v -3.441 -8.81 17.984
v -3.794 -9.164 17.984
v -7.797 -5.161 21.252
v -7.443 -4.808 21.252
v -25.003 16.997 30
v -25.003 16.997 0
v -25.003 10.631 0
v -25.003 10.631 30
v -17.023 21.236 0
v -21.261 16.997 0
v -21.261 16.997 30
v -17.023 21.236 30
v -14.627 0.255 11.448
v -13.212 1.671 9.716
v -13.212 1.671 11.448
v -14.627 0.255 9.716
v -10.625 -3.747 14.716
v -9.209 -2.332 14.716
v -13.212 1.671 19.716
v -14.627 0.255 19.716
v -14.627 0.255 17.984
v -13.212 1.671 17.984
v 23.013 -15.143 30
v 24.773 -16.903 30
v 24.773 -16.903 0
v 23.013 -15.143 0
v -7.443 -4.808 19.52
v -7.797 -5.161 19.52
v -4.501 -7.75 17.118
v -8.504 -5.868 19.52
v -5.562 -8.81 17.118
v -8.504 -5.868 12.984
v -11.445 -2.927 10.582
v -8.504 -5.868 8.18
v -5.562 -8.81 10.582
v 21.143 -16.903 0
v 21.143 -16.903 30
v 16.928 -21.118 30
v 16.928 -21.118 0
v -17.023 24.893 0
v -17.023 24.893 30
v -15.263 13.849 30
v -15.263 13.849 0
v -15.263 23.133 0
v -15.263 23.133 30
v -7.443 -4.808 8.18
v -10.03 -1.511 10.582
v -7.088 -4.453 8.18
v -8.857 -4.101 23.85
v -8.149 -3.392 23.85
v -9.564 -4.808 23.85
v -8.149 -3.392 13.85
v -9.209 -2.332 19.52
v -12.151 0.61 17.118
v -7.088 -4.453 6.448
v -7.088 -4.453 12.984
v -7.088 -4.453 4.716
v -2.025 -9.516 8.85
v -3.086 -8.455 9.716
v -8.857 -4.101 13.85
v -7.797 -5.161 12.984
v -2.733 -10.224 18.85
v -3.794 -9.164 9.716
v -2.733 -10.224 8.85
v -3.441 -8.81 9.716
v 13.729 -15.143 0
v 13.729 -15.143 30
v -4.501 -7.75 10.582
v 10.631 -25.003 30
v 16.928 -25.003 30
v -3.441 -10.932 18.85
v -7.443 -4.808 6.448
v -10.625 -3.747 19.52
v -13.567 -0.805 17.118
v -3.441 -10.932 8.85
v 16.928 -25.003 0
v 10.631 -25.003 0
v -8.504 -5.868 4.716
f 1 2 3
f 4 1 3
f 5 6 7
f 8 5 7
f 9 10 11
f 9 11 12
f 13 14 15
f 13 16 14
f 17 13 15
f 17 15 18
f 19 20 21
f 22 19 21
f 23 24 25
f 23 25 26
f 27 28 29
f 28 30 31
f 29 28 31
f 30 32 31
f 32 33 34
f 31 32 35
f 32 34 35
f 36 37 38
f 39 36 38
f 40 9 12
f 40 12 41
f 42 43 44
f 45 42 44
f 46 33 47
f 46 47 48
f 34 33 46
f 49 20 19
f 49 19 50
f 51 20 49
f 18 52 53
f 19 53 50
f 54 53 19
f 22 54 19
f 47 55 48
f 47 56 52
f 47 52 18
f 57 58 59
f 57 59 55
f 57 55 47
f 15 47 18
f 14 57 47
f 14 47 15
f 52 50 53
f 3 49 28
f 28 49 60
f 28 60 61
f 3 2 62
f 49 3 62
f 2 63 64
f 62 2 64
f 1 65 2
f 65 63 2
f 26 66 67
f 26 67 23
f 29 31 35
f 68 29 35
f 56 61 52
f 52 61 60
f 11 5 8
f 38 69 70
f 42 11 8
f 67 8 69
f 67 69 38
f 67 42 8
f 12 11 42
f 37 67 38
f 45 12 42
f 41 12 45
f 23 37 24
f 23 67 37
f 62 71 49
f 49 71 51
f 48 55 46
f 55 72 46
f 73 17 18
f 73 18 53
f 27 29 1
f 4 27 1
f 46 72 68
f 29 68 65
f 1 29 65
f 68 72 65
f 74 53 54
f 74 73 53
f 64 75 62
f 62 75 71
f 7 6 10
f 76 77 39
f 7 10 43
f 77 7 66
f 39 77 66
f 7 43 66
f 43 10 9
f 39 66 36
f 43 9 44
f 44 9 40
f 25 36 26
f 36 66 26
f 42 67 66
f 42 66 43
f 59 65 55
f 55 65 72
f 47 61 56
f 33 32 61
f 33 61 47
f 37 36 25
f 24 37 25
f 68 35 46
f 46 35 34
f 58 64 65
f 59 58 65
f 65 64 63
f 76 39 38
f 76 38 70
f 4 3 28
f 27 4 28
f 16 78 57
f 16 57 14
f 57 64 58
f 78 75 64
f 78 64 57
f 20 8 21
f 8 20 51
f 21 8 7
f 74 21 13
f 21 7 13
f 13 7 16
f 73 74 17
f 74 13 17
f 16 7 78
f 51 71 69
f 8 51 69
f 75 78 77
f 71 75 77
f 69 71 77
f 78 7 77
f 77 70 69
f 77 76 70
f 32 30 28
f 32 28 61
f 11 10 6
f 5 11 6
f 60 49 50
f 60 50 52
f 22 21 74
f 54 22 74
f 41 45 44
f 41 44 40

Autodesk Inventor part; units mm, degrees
ref_plane "YZ Plane" through (0, 0, 0) normal (1, 0, 0) x (0, 1, 0)
ref_plane "XZ Plane" through (0, 0, 0) normal (0, 1, 0) x (-1, 0, 0)
sketch "Sketch1" plane through (0, 0, 0) normal (0, 0, 1) x (1, 0, 0)
  line L0 (21.1431, -16.9027) -> (16.9281, -21.1177)
  line L1 (-21.2613, 16.9973) -> (-17.0227, 21.2358)
  line L2 (-17.0227, 21.2358) -> (16.9281, -21.1177) construction
  line L3 (21.1431, -16.9027) -> (-21.2613, 16.9973) construction
  line L4 (-17.0227, 21.2358) -> (36.8231, 21.2358) construction
  line L5 (16.9281, -21.1177) -> (16.9281, -25.0027)
  line L6 (-17.0227, 21.2358) -> (-17.0227, 24.8927)
  line L7 (21.1431, -16.9027) -> (24.7727, -16.9027)
  line L8 (24.7727, -16.9027) -> (-17.0227, 24.8927)
  line L9 (-25.0027, 16.9973) -> (-25.0027, 10.6306)
  line L10 (16.9281, -25.0027) -> (10.6306, -25.0027)
  line L11 (-25.0027, 10.6306) -> (10.6306, -25.0027)
  line L12 (-25.0027, 16.9973) -> (-7.0741, 16.9973) construction
  line L13 (-17.1227, 21.2773) -> (-21.3027, 17.0973)
  line L14 (16.8927, -21.1827) -> (21.0727, -17.0027)
  line L15 (24.7727, -17.0027) -> (21.1414, -17.0027)
  line L16 (22.7727, -25.0027) -> (-23.0273, -25.0027)
  line L17 (16.8927, -25.0027) -> (16.8927, -21.2526)
  line L18 (-17.1227, 25.0973) -> (-17.1227, 21.3471)
  line L19 (-25.0027, 17.0973) -> (-21.3714, 17.0973)
  line L20 (-21.2613, 16.9973) -> (-25.0027, 16.9973)
  point P0 (0, 0)
  point P1 (16.8927, -21.2526)
extrude "Extrusion1" add sketch "Sketch1" along normal blind 30
ref_plane "Work Plane1" through (16.9, -16.9, -8) normal (-0.7071068, -0.7071068, 0) x (0, 0, 1)
sketch "Sketch7" plane through (0, 0, 30) normal (0, 0, 1) x (1, 0, 0)
  line L0 (21.1431, -16.9027) -> (24.7727, -16.9027) projected
  line L1 (24.7727, -16.9027) -> (-17.0227, 24.8927) projected
  line L2 (-17.0227, 24.8927) -> (-17.0227, 21.2358) projected
  line L3 (-17.0227, 21.2358) -> (-21.2613, 16.9973) projected
  line L4 (-21.2613, 16.9973) -> (-25.0027, 16.9973) projected
  line L5 (-25.0027, 16.9973) -> (-25.0027, 10.6306) projected
  line L6 (-25.0027, 10.6306) -> (10.6306, -25.0027) projected
  line L7 (10.6306, -25.0027) -> (16.9281, -25.0027) projected
  line L8 (16.9281, -25.0027) -> (16.9281, -21.1177) projected
  line L9 (16.9281, -21.1177) -> (21.1431, -16.9027) projected
  line L10 (3.875, 3.995) -> (-7.1861, -7.1861)
  line L11 (-25.0027, 10.6306) -> (10.6306, -25.0027) projected
  line L12 (23.0128, -5.8586) -> (13.7286, -15.1428)
  line L13 (13.7286, -15.1428) -> (-15.2628, 13.8486)
  line L14 (-15.2628, 13.8486) -> (-5.9786, 23.1328)
  line L15 (-5.9786, 23.1328) -> (23.0128, -5.8586)
  line L16 (23.0128, -5.8586) -> (-15.2628, 13.8486) construction
  line L17 (13.7286, -15.1428) -> (-5.9786, 23.1328) construction
  line L18 (-15.2628, 13.8486) -> (-15.2628, 23.1328)
  line L19 (24.7727, -16.9027) -> (-17.0227, 24.8927) projected
  line L20 (13.7286, -15.1428) -> (23.0128, -15.1428)
  point P0 (0, 0)
  dimension "d28" = 41
  dimension "d29" = 1
  dimension "d74" = 0
extrude "Extrusion7" cut sketch "Sketch7" against normal through all contours L20 L12 L1 | L12 L13 L10 L1 | L1 L14 L15 L12 | L10 L13 L14 L1 | L14 L18 L1
sketch "Sketch10" plane through (10.6306, -25.0027, 30) normal (-0.7071068, -0.7071068, 0) x (-0.7071068, 0.7071068, 0)
  line L0 (1.6838, 16.5215) -> (7.0744, 19.4702) construction
  line L1 (7.0744, 19.4702) -> (7.0744, 10.5304) construction
  line L2 (7.0744, 10.5304) -> (1.6838, 10.5304) construction
  line L3 (1.6838, 10.5304) -> (1.6838, 6.839) construction
  line L4 (1.6838, 6.839) -> (6.7206, 6.839) construction
  line L5 (6.7206, 6.839) -> (6.7206, 1.2092) construction
  line L6 (6.7206, 1.2092) -> (1.6838, 1.2092) construction
  line L7 (1.6838, 1.2092) -> (1.6838, -3.423) construction
  line L8 (1.6838, -3.423) -> (55.1934, -3.423) construction
  line L9 (1.6838, 30.377) -> (1.6838, 26.2152) construction
  line L10 (1.6838, 26.2152) -> (7.1181, 26.2152) construction
  line L11 (7.1181, 26.2152) -> (7.1181, 20.0634) construction
  line L12 (7.1181, 20.0634) -> (1.6838, 20.0634) construction
  line L13 (1.6838, 20.0634) -> (1.6838, 16.5215) construction
  line L14 (7.0744, 15.0003) -> (55.1934, 14.9149) construction
  line L15 (1.6838, 30.377) -> (36.6838, 30.377) construction
  line L16 (36.6838, -3.423) -> (1.6838, -3.423) construction
  line L17 (19.8996, 21.1501) -> (19.8996, 11.1501)
  line L18 (19.8996, 11.1501) -> (28.5599, 6.1501)
  line L19 (19.8996, 21.1501) -> (21.3996, 20.2841)
  line L20 (21.3996, 20.2841) -> (21.3996, 12.0161)
  line L21 (21.3996, 12.0161) -> (27.0599, 8.7482)
  line L22 (27.0599, 8.7482) -> (27.0599, 17.0161)
  line L23 (27.0599, 17.0161) -> (28.5599, 16.1501)
  line L24 (28.5599, 16.1501) -> (28.5599, 6.1501)
  line L25 (50.3931, 0) -> (0, 0) construction
  line L26 (50.3931, 30) -> (50.3931, 0) construction
  line L27 (50.3931, 15) -> (0, 15) construction
  line L28 (0, 30) -> (0, 0) construction
  point P0 (25.1966, 30)
  point P1 (25.1966, 15)
  dimension "d40" = 1.5
  dimension "d41" = 1.5
  dimension "d42" = 1.5
  dimension "d43" = 10
  dimension "d44" = 10
  dimension "d75" = 8.268
  dimension "d76" = 120
emboss "Emboss1" sketch "Sketch10" operation cut depth 1 direction (0.7071068, 0.7071068, 0)
sketch "Sketch11" plane through (10.6306, -25.0027, 30) normal (-0.7071068, -0.7071068, 0) x (-0.7071068, 0.7071068, 0)
  line L0 (21.3996, 12.0161) -> (27.0599, 8.7482) construction
  line L1 (27.0599, 8.7482) -> (27.0599, 17.0161) construction
  line L2 (27.0599, 17.0161) -> (28.5599, 16.1501) construction
  line L3 (28.5599, 16.1501) -> (28.5599, 6.1501) construction
  line L4 (28.5599, 6.1501) -> (19.8996, 11.1501) construction
  line L5 (19.8996, 11.1501) -> (19.8996, 21.1501) construction
  line L6 (19.8996, 21.1501) -> (21.3996, 20.2841) construction
  line L7 (21.3996, 20.2841) -> (21.3996, 12.0161) construction
  line L8 (50.3931, 30) -> (0, 30) construction
  line L9 (0, 30) -> (0, 0) construction
  line L10 (50.3931, 0) -> (0, 0) construction
  line L11 (50.3931, 30) -> (50.3931, 0) construction
  line L12 (9.2379, 27.3057) -> (21.3996, 20.2841) construction
  line L13 (21.3996, 20.2841) -> (21.3996, 12.0161) construction
  line L14 (21.3996, 12.0161) -> (27.0599, 8.7482) construction
  line L15 (27.0599, 8.7482) -> (27.0599, 7.4216) construction
  line L16 (27.0599, 7.4216) -> (17.8982, 13.0177) construction
  line L17 (17.8982, 13.0177) -> (17.8982, 3.0177) construction
  line L18 (17.8982, 3.0177) -> (9.2379, 8.0177) construction
  line L19 (9.2379, 8.0177) -> (9.2379, 27.3057) construction
  line L20 (15.5651, 18.4016) -> (15.5, -16.9) construction
  line L21 (15.5651, 18.4016) -> (-17.5, 16.9) construction
  line L22 (-17.5, 16.9) -> (-17.5, 12.7382) construction
  line L23 (-17.5, 12.7382) -> (-12.0658, 12.7382) construction
  line L24 (-12.0658, 12.7382) -> (-12.0658, 6.5864) construction
  line L25 (-12.0658, 6.5864) -> (-17.5, 6.5864) construction
  line L26 (-17.5, 6.5864) -> (-17.5, 3.0446) construction
  line L27 (-17.5, 3.0446) -> (-12.1095, 3.0446) construction
  line L28 (-12.1095, 3.0446) -> (-12.1095, -2.9465) construction
  line L29 (-12.1095, -2.9465) -> (-17.5, -2.9465) construction
  line L30 (-17.5, -2.9465) -> (-17.5, -6.638) construction
  line L31 (-17.5, -6.638) -> (-12.4632, -6.638) construction
  line L32 (-12.4632, -6.638) -> (-12.4632, -12.2678) construction
  line L33 (-12.4632, -12.2678) -> (-17.5, -12.2678) construction
  line L34 (-17.5, -12.2678) -> (-17.5, -16.9) construction
  line L35 (-17.5, -16.9) -> (15.5, -16.9) construction
  line L36 (-12.1095, 0.049) -> (15.5326, 0.7508) construction
  line L37 (15.5, -16.9) -> (15.5651, 18.4016) construction
  line L38 (1.91, 17.7815) -> (1.91, -16.9) construction
  line L39 (15.5, -16.9) -> (-17.5, -16.9) construction
  line L40 (27.0599, 8.7482) -> (27.0599, 7.4216) construction
  line L41 (21.3996, 20.2841) -> (21.3996, 12.0161)
  line L42 (21.3996, 12.0161) -> (27.0599, 8.7482)
  line L43 (21.3996, 20.2841) -> (21.3996, 12.0161)
  line L44 (21.3996, 12.0161) -> (27.0599, 8.7482)
  line L45 (27.0599, 8.7482) -> (27.0599, 10.4802)
  line L46 (27.0599, 8.7482) -> (27.0599, 7.4216)
  line L47 (27.0599, 10.4802) -> (22.8996, 12.8822)
  line L48 (22.8996, 12.8822) -> (22.8996, 19.4181)
  line L49 (22.8996, 19.4181) -> (27.0599, 21.82)
  line L50 (21.3996, 20.2841) -> (27.0599, 23.552)
  line L51 (27.0599, 23.552) -> (27.0599, 21.82)
  point P0 (25.1966, 30)
  point P1 (20.9754, 14.9785)
  dimension "d47" = 120
  dimension "d48" = 1.5
  dimension "d49" = 1.5
  dimension "d50" = 1.5
  dimension "d77" = 8.268
  dimension "d78" = 4.1602
  dimension "d79" = 5.6602
  dimension "d80" = 120
  dimension "d81" = 120
emboss "Emboss2" sketch "Sketch11" operation cut depth 1.5 direction (0.7071068, 0.7071068, 0)
sketch "Sketch12" plane through (10.6306, -25.0027, 30) normal (-0.7071068, -0.7071068, 0) x (-0.7071068, 0.7071068, 0)
  line L0 (22.8996, 12.8822) -> (27.0599, 10.4802) construction
  line L1 (27.0599, 10.4802) -> (27.0599, 17.0161) construction
  line L2 (27.0599, 17.0161) -> (28.5599, 16.1501) construction
  line L3 (28.5599, 16.1501) -> (28.5599, 6.1501) construction
  line L4 (28.5599, 6.1501) -> (19.8996, 11.1501) construction
  line L5 (19.8996, 11.1501) -> (19.8996, 21.1501) construction
  line L6 (19.8996, 21.1501) -> (21.3996, 20.2841) construction
  line L7 (21.3996, 20.2841) -> (27.0599, 23.552) construction
  line L8 (27.0599, 23.552) -> (27.0599, 21.82) construction
  line L9 (27.0599, 21.82) -> (22.8996, 19.4181) construction
  line L10 (22.8996, 19.4181) -> (22.8996, 12.8822) construction
  line L11 (50.3931, 30) -> (0, 30) construction
  line L12 (0, 30) -> (0, 0) construction
  line L13 (50.3931, 0) -> (0, 0) construction
  line L14 (50.3931, 30) -> (50.3931, 0) construction
  line L15 (12.7689, 9.4432) -> (16.9291, 7.0413) construction
  line L16 (16.9291, 7.0413) -> (27.0599, 17.0161) construction
  line L17 (27.0599, 17.0161) -> (28.5599, 16.1501) construction
  line L18 (28.5599, 16.1501) -> (28.5599, 6.1501) construction
  line L19 (28.5599, 6.1501) -> (13.0911, 5.9826) construction
  line L20 (13.0911, 5.9826) -> (19.8996, 21.1501) construction
  line L21 (19.8996, 21.1501) -> (21.3996, 20.2841) construction
  line L22 (21.3996, 20.2841) -> (27.0599, 23.552) construction
  line L23 (27.0599, 23.552) -> (27.0599, 21.82) construction
  line L24 (27.0599, 21.82) -> (12.7689, 15.9791) construction
  line L25 (12.7689, 15.9791) -> (12.7689, 9.4432) construction
  line L26 (-17.5, 16.9) -> (-17.5, 12.7382) construction
  line L27 (-17.5, 12.7382) -> (-12.0658, 12.7382) construction
  line L28 (-12.0658, 12.7382) -> (-12.0658, 6.5864) construction
  line L29 (-12.0658, 6.5864) -> (-17.5, 6.5864) construction
  line L30 (-17.5, 6.5864) -> (-17.5, 3.0446) construction
  line L31 (-17.5, 3.0446) -> (-12.1095, 3.0446) construction
  line L32 (-12.1095, 3.0446) -> (-12.1095, -2.9465) construction
  line L33 (-12.1095, -2.9465) -> (-17.5, -2.9465) construction
  line L34 (-17.5, -2.9465) -> (-17.5, -6.638) construction
  line L35 (-17.5, -6.638) -> (-12.4632, -6.638) construction
  line L36 (-12.4632, -6.638) -> (-12.4632, -12.2678) construction
  line L37 (-12.4632, -12.2678) -> (-17.5, -12.2678) construction
  line L38 (-17.5, -12.2678) -> (-17.5, -16.9) construction
  line L39 (-17.5, -16.9) -> (15.5, -16.9) construction
  line L40 (21.3996, 20.2841) -> (27.0599, 23.552)
  line L41 (19.8996, 21.1501) -> (21.3996, 20.2841)
  line L42 (21.3996, 20.2841) -> (27.0599, 23.552)
  line L43 (27.0599, 23.552) -> (27.0599, 21.82)
  line L44 (27.0599, 23.552) -> (27.0599, 21.82)
  line L45 (16.9291, 7.0413) -> (27.0599, 17.0161) construction
  line L46 (19.8996, 21.1501) -> (27.0599, 25.2841)
  line L47 (27.0599, 25.2841) -> (35.7201, 20.2841)
  line L48 (35.7201, 20.2841) -> (35.7201, 18.552)
  line L49 (35.7201, 18.552) -> (30.0599, 15.2841)
  line L50 (30.0599, 15.2841) -> (30.0599, 10.4802)
  line L51 (30.0599, 10.4802) -> (34.2201, 12.8822)
  line L52 (35.7201, 10.2841) -> (35.7201, 10.2841)
  line L53 (35.7201, 10.2841) -> (28.5599, 6.1501)
  line L54 (27.0599, 17.0161) -> (28.5599, 16.1501)
  line L55 (28.5599, 6.1501) -> (28.5599, 16.1501)
  line L56 (28.5599, 16.1501) -> (27.0599, 17.0161)
  line L57 (27.0599, 21.82) -> (27.0599, 23.552)
  line L58 (28.5599, 16.1501) -> (28.5599, 6.1501)
  line L59 (27.0599, 17.0161) -> (31.2201, 19.4181)
  line L60 (31.2201, 19.4181) -> (27.0599, 21.82)
  line L61 (13.0911, 5.9826) -> (28.5599, 6.1501) construction
  line L62 (12.7689, 9.4432) -> (16.9291, 7.0413) construction
  line L63 (12.7689, 9.4432) -> (28.5599, 9.6142) construction
  line L64 (28.5599, 9.6142) -> (29.486, 10.1489) construction
  line L65 (28.5599, 16.1501) -> (35.7201, 20.2841) construction
  line L66 (28.5599, 6.1501) -> (34.2971, 9.4625) construction
  line L67 (31.2201, 19.4181) -> (35.3769, 18.7502) construction
  line L68 (27.0599, 23.552) -> (27.0599, 21.82) construction
  line L69 (35.3769, 18.7502) -> (27.0599, 23.552) construction
  line L70 (35.7201, 10.2841) -> (35.7201, 12.0161)
  line L71 (35.7201, 12.0161) -> (34.2201, 12.8822)
  line L72 (16.3223, 7.4494) -> (20.4826, 5.0475) construction
  line L73 (16.3223, 13.9853) -> (16.3223, 7.4494) construction
  line L74 (20.4826, 16.3872) -> (16.3223, 13.9853) construction
  line L75 (20.4826, 18.1193) -> (20.4826, 16.3872) construction
  line L76 (14.8223, 14.8513) -> (20.4826, 18.1193) construction
  line L77 (14.8223, 15.7065) -> (14.8223, 14.8513) construction
  line L78 (20.4826, 12.5307) -> (14.8223, 15.7065) construction
  line L79 (20.4826, 5.0475) -> (20.4826, 12.5307) construction
  line L80 (20.4826, 12.5307) -> (28.5599, 7.9987) construction
  line L81 (28.5599, 7.9987) -> (33.93, 11.0117) construction
  point P0 (25.1966, 30)
  point P1 (20.9754, 14.9785)
  dimension "d54" = 60
  dimension "d55" = 1.5
  dimension "d57" = 120
  dimension "d58" = 1.5
  dimension "d59" = 120
  dimension "d82" = 3
  dimension "d83" = 3
  dimension "d84" = 3
  dimension "d85" = 1.5
  dimension "d86" = 7.1602
  dimension "d87" = 7.1602
  dimension "d88" = 4.1602
  dimension "d89" = 1.7321
  dimension "d90" = 5.6602
  dimension "d91" = 1.7321
  dimension "d92" = 4.1602
extrude "Extrusion9" cut sketch "Sketch12" against normal blind 2
ref_plane "Arbeitsebene4" through (-16.9409, 16.9409, 0) normal (-0.7071068, -0.7071068, 0) x (0, 0, 1)
ref_plane "Arbeitsebene5" through (-2.1793, -2.1793, 0) normal (-0.7071068, 0.7071068, 0) x (-0.7071068, -0.7071068, 0)
equation "\"d3\" = MirrorThickness1"
equation "\"d41\" = d40"
equation "\"d42\" = d40"
equation "\"d44\" = d43"
equation "\"d48\" = d51"
equation "\"d49\" = d51"
equation "\"d50\" = d51"
equation "\"d55\" = d60"
equation "\"d58\" = d60"
equation "\"MirrorThickness1\" = 30"
equation "\"d51\" = 1.5"
equation "\"d60\" = 1.5"
properties part number "20_Cube_Insert_Mirror_Holder_wLogo_Astromedia_30x40x1_v3"
